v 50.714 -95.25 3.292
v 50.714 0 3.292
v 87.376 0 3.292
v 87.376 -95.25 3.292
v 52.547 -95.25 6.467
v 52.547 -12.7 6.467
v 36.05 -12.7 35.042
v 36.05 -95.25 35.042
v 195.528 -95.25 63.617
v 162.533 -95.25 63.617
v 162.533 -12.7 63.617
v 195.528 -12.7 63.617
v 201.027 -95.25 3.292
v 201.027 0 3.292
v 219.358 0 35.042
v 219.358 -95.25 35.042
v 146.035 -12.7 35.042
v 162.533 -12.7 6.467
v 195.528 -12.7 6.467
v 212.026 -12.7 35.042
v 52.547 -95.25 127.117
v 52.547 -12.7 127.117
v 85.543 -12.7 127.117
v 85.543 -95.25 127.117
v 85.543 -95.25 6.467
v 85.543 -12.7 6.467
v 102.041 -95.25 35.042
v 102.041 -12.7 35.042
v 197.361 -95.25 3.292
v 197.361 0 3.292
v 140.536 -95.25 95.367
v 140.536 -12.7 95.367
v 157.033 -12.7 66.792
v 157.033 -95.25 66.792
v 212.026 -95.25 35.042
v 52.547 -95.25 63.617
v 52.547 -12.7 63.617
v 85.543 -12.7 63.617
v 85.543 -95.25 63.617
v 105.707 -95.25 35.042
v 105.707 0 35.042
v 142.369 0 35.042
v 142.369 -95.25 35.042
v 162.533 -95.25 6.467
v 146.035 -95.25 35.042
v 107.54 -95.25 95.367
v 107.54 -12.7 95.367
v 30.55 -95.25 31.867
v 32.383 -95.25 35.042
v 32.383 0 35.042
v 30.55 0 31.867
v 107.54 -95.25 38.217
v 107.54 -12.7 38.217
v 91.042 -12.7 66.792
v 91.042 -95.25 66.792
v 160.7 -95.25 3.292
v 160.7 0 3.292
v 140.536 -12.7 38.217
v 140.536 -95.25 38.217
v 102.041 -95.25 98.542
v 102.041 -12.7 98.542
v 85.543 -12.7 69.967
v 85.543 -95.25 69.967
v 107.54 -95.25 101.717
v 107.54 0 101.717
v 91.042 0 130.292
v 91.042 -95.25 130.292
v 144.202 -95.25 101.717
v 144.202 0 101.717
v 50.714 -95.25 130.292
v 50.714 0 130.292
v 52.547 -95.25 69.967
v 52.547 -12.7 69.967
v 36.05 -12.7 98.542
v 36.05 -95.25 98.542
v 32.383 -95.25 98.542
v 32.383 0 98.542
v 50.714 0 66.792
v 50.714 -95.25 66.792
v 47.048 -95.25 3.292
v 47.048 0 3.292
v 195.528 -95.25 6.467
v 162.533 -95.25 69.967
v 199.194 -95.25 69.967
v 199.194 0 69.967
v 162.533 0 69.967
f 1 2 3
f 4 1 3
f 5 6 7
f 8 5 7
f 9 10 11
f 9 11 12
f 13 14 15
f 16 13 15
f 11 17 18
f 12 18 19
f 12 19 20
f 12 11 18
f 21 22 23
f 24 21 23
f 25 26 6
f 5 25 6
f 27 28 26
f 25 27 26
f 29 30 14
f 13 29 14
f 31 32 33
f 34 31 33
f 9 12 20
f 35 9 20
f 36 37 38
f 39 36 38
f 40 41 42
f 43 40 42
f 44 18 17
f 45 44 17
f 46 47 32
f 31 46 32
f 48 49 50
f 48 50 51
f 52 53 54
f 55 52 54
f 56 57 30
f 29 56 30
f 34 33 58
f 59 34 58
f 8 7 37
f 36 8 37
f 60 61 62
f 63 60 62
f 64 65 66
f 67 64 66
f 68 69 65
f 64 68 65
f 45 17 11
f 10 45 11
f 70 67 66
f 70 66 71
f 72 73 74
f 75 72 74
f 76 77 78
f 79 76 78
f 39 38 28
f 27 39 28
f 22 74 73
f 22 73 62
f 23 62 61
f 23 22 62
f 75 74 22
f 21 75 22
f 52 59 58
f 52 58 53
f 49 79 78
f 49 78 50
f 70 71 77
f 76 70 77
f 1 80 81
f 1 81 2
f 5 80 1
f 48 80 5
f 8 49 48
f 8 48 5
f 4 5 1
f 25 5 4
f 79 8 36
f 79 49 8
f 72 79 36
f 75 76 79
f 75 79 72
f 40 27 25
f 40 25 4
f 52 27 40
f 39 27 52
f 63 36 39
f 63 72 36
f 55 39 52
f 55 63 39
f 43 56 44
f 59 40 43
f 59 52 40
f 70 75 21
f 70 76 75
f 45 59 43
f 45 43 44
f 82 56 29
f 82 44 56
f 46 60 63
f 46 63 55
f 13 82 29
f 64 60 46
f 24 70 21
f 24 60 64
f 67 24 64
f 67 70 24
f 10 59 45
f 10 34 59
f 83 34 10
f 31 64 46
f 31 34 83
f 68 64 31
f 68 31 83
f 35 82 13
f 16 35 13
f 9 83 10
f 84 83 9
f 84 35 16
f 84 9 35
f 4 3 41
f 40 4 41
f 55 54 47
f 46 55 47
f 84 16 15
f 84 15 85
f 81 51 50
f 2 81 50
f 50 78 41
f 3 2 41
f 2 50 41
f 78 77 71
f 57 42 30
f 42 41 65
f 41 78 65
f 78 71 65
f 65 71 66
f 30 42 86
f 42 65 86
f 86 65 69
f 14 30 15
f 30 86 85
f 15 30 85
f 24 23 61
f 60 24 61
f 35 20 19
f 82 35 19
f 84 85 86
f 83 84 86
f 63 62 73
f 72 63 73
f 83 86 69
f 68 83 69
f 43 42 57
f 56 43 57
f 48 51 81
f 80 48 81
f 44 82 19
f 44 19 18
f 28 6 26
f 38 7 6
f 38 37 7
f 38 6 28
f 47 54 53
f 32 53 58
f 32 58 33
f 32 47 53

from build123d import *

# Parameters (mm, degrees)
F1_DEPTH = 12.7
F2_DEPTH = 95.25


# Not quite as in the source:
# - a feature names something its author has since deleted; it is built from what else it names


with BuildPart() as f1:
    # F0 (on Front) → F1 (new body)
    with BuildSketch(Plane.XZ):
        Polygon((87.3760877519, 66.7924993012), (50.7143456583, 66.7924993012), (32.3834746116, 35.0424993012), (50.7143456583, 3.2924993012), (87.3760877518, 3.2924993011), (105.7069587986, 35.0424993011), align=None)
        Polygon((52.547432763, 6.4674993012), (36.0496488209, 35.0424993012), (52.547432763, 63.6174993012), (85.5430006472, 63.6174993011), (102.0407845893, 35.0424993011), (85.5430006472, 6.4674993011), align=None, mode=Mode.SUBTRACT)
        Polygon((50.7143456583, 130.2924993012), (32.3834746116, 98.5424993012), (50.7143456583, 66.7924993012), (87.3760877519, 66.7924993012), (105.7069587986, 98.5424993012), (87.3760877519, 130.2924993012), align=None)
        Polygon((52.547432763, 69.9674993012), (36.0496488209, 98.5424993012), (52.547432763, 127.1174993012), (85.5430006472, 127.1174993012), (102.0407845893, 98.5424993012), (85.5430006472, 69.9674993012), align=None, mode=Mode.SUBTRACT)
        Polygon((160.699571939, 66.7924993012), (142.3687008922, 35.0424993012), (160.6995719389, 3.2924993011), (197.3613140325, 3.2924993011), (215.6921850793, 35.0424993012), (197.3613140325, 66.7924993012), align=None)
        Polygon((162.5326590436, 6.4674993012), (146.0348751015, 35.0424993012), (162.5326590436, 63.6174993012), (195.5282269278, 63.6174993012), (212.0260108699, 35.0424993012), (195.5282269278, 6.4674993012), align=None, mode=Mode.SUBTRACT)
        Polygon((105.7069587986, 98.5424993012), (87.3760877519, 66.7924993012), (105.7069587986, 35.0424993011), (142.3687008922, 35.0424993011), (160.699571939, 66.7924993012), (142.3687008922, 98.5424993012), align=None)
        Polygon((107.5400459033, 38.2174993012), (91.0422619612, 66.7924993012), (107.5400459033, 95.3674993012), (140.5356137875, 95.3674993012), (157.0333977296, 66.7924993012), (140.5356137875, 38.2174993012), align=None, mode=Mode.SUBTRACT)
        Polygon((52.547432763, 127.1174993012), (36.0496488209, 98.5424993012), (52.547432763, 69.9674993012), (85.5430006472, 69.9674993012), (102.0407845893, 98.5424993012), (85.5430006472, 127.1174993012), align=None)
        Polygon((52.547432763, 63.6174993012), (36.0496488209, 35.0424993012), (52.547432763, 6.4674993012), (85.5430006472, 6.4674993011), (102.0407845893, 35.0424993011), (85.5430006472, 63.6174993011), align=None)
        Polygon((162.5326590436, 63.6174993012), (146.0348751015, 35.0424993012), (162.5326590436, 6.4674993012), (195.5282269278, 6.4674993012), (212.0260108699, 35.0424993012), (195.5282269278, 63.6174993012), align=None)
        Polygon((107.5400459033, 95.3674993012), (91.0422619612, 66.7924993012), (107.5400459033, 38.2174993012), (140.5356137875, 38.2174993012), (157.0333977296, 66.7924993012), (140.5356137875, 95.3674993012), align=None)
    extrude(amount=F1_DEPTH)

    # F0 (on Front) → F2 (join)
    with BuildSketch(Plane.XZ):
        Polygon((50.7143456583, 130.2924993012), (32.3834746116, 98.5424993012), (50.7143456583, 66.7924993012), (87.3760877519, 66.7924993012), (105.7069587986, 98.5424993012), (87.3760877519, 130.2924993012), align=None)
        Polygon((52.547432763, 69.9674993012), (36.0496488209, 98.5424993012), (52.547432763, 127.1174993012), (85.5430006472, 127.1174993012), (102.0407845893, 98.5424993012), (85.5430006472, 69.9674993012), align=None, mode=Mode.SUBTRACT)
        Polygon((87.3760877519, 66.7924993012), (50.7143456583, 66.7924993012), (32.3834746116, 35.0424993012), (50.7143456583, 3.2924993012), (87.3760877518, 3.2924993011), (105.7069587986, 35.0424993011), align=None)
        Polygon((52.547432763, 6.4674993012), (36.0496488209, 35.0424993012), (52.547432763, 63.6174993012), (85.5430006472, 63.6174993011), (102.0407845893, 35.0424993011), (85.5430006472, 6.4674993011), align=None, mode=Mode.SUBTRACT)
        Polygon((105.7069587986, 98.5424993012), (87.3760877519, 66.7924993012), (105.7069587986, 35.0424993011), (142.3687008922, 35.0424993011), (160.699571939, 66.7924993012), (142.3687008922, 98.5424993012), align=None)
        Polygon((107.5400459033, 38.2174993012), (91.0422619612, 66.7924993012), (107.5400459033, 95.3674993012), (140.5356137875, 95.3674993012), (157.0333977296, 66.7924993012), (140.5356137875, 38.2174993012), align=None, mode=Mode.SUBTRACT)
        Polygon((160.699571939, 66.7924993012), (142.3687008922, 35.0424993012), (160.6995719389, 3.2924993011), (197.3613140325, 3.2924993011), (215.6921850793, 35.0424993012), (197.3613140325, 66.7924993012), align=None)
        Polygon((162.5326590436, 6.4674993012), (146.0348751015, 35.0424993012), (162.5326590436, 63.6174993012), (195.5282269278, 63.6174993012), (212.0260108699, 35.0424993012), (195.5282269278, 6.4674993012), align=None, mode=Mode.SUBTRACT)
        Polygon((91.0422619612, 130.2924993012), (87.3760877519, 130.2924993012), (105.7069587986, 98.5424993012), (142.3687008922, 98.5424993012), (160.699571939, 66.7924993012), (197.3613140325, 66.7924993012), (215.6921850793, 35.0424993012), (197.3613140325, 3.2924993012), (201.0274882418, 3.2924993011), (219.3583592886, 35.0424993012), (199.1944011372, 69.9674993012), (162.5326590436, 69.9674993012), (144.2017879969, 101.7174993012), (107.5400459033, 101.7174993012), align=None)
        Polygon((50.7143456583, 3.2924993012), (32.3834746116, 35.0424993012), (30.5503875069, 31.8674993012), (47.048171449, 3.2924993012), align=None)
    extrude(amount=F2_DEPTH)


solid = f1.part
